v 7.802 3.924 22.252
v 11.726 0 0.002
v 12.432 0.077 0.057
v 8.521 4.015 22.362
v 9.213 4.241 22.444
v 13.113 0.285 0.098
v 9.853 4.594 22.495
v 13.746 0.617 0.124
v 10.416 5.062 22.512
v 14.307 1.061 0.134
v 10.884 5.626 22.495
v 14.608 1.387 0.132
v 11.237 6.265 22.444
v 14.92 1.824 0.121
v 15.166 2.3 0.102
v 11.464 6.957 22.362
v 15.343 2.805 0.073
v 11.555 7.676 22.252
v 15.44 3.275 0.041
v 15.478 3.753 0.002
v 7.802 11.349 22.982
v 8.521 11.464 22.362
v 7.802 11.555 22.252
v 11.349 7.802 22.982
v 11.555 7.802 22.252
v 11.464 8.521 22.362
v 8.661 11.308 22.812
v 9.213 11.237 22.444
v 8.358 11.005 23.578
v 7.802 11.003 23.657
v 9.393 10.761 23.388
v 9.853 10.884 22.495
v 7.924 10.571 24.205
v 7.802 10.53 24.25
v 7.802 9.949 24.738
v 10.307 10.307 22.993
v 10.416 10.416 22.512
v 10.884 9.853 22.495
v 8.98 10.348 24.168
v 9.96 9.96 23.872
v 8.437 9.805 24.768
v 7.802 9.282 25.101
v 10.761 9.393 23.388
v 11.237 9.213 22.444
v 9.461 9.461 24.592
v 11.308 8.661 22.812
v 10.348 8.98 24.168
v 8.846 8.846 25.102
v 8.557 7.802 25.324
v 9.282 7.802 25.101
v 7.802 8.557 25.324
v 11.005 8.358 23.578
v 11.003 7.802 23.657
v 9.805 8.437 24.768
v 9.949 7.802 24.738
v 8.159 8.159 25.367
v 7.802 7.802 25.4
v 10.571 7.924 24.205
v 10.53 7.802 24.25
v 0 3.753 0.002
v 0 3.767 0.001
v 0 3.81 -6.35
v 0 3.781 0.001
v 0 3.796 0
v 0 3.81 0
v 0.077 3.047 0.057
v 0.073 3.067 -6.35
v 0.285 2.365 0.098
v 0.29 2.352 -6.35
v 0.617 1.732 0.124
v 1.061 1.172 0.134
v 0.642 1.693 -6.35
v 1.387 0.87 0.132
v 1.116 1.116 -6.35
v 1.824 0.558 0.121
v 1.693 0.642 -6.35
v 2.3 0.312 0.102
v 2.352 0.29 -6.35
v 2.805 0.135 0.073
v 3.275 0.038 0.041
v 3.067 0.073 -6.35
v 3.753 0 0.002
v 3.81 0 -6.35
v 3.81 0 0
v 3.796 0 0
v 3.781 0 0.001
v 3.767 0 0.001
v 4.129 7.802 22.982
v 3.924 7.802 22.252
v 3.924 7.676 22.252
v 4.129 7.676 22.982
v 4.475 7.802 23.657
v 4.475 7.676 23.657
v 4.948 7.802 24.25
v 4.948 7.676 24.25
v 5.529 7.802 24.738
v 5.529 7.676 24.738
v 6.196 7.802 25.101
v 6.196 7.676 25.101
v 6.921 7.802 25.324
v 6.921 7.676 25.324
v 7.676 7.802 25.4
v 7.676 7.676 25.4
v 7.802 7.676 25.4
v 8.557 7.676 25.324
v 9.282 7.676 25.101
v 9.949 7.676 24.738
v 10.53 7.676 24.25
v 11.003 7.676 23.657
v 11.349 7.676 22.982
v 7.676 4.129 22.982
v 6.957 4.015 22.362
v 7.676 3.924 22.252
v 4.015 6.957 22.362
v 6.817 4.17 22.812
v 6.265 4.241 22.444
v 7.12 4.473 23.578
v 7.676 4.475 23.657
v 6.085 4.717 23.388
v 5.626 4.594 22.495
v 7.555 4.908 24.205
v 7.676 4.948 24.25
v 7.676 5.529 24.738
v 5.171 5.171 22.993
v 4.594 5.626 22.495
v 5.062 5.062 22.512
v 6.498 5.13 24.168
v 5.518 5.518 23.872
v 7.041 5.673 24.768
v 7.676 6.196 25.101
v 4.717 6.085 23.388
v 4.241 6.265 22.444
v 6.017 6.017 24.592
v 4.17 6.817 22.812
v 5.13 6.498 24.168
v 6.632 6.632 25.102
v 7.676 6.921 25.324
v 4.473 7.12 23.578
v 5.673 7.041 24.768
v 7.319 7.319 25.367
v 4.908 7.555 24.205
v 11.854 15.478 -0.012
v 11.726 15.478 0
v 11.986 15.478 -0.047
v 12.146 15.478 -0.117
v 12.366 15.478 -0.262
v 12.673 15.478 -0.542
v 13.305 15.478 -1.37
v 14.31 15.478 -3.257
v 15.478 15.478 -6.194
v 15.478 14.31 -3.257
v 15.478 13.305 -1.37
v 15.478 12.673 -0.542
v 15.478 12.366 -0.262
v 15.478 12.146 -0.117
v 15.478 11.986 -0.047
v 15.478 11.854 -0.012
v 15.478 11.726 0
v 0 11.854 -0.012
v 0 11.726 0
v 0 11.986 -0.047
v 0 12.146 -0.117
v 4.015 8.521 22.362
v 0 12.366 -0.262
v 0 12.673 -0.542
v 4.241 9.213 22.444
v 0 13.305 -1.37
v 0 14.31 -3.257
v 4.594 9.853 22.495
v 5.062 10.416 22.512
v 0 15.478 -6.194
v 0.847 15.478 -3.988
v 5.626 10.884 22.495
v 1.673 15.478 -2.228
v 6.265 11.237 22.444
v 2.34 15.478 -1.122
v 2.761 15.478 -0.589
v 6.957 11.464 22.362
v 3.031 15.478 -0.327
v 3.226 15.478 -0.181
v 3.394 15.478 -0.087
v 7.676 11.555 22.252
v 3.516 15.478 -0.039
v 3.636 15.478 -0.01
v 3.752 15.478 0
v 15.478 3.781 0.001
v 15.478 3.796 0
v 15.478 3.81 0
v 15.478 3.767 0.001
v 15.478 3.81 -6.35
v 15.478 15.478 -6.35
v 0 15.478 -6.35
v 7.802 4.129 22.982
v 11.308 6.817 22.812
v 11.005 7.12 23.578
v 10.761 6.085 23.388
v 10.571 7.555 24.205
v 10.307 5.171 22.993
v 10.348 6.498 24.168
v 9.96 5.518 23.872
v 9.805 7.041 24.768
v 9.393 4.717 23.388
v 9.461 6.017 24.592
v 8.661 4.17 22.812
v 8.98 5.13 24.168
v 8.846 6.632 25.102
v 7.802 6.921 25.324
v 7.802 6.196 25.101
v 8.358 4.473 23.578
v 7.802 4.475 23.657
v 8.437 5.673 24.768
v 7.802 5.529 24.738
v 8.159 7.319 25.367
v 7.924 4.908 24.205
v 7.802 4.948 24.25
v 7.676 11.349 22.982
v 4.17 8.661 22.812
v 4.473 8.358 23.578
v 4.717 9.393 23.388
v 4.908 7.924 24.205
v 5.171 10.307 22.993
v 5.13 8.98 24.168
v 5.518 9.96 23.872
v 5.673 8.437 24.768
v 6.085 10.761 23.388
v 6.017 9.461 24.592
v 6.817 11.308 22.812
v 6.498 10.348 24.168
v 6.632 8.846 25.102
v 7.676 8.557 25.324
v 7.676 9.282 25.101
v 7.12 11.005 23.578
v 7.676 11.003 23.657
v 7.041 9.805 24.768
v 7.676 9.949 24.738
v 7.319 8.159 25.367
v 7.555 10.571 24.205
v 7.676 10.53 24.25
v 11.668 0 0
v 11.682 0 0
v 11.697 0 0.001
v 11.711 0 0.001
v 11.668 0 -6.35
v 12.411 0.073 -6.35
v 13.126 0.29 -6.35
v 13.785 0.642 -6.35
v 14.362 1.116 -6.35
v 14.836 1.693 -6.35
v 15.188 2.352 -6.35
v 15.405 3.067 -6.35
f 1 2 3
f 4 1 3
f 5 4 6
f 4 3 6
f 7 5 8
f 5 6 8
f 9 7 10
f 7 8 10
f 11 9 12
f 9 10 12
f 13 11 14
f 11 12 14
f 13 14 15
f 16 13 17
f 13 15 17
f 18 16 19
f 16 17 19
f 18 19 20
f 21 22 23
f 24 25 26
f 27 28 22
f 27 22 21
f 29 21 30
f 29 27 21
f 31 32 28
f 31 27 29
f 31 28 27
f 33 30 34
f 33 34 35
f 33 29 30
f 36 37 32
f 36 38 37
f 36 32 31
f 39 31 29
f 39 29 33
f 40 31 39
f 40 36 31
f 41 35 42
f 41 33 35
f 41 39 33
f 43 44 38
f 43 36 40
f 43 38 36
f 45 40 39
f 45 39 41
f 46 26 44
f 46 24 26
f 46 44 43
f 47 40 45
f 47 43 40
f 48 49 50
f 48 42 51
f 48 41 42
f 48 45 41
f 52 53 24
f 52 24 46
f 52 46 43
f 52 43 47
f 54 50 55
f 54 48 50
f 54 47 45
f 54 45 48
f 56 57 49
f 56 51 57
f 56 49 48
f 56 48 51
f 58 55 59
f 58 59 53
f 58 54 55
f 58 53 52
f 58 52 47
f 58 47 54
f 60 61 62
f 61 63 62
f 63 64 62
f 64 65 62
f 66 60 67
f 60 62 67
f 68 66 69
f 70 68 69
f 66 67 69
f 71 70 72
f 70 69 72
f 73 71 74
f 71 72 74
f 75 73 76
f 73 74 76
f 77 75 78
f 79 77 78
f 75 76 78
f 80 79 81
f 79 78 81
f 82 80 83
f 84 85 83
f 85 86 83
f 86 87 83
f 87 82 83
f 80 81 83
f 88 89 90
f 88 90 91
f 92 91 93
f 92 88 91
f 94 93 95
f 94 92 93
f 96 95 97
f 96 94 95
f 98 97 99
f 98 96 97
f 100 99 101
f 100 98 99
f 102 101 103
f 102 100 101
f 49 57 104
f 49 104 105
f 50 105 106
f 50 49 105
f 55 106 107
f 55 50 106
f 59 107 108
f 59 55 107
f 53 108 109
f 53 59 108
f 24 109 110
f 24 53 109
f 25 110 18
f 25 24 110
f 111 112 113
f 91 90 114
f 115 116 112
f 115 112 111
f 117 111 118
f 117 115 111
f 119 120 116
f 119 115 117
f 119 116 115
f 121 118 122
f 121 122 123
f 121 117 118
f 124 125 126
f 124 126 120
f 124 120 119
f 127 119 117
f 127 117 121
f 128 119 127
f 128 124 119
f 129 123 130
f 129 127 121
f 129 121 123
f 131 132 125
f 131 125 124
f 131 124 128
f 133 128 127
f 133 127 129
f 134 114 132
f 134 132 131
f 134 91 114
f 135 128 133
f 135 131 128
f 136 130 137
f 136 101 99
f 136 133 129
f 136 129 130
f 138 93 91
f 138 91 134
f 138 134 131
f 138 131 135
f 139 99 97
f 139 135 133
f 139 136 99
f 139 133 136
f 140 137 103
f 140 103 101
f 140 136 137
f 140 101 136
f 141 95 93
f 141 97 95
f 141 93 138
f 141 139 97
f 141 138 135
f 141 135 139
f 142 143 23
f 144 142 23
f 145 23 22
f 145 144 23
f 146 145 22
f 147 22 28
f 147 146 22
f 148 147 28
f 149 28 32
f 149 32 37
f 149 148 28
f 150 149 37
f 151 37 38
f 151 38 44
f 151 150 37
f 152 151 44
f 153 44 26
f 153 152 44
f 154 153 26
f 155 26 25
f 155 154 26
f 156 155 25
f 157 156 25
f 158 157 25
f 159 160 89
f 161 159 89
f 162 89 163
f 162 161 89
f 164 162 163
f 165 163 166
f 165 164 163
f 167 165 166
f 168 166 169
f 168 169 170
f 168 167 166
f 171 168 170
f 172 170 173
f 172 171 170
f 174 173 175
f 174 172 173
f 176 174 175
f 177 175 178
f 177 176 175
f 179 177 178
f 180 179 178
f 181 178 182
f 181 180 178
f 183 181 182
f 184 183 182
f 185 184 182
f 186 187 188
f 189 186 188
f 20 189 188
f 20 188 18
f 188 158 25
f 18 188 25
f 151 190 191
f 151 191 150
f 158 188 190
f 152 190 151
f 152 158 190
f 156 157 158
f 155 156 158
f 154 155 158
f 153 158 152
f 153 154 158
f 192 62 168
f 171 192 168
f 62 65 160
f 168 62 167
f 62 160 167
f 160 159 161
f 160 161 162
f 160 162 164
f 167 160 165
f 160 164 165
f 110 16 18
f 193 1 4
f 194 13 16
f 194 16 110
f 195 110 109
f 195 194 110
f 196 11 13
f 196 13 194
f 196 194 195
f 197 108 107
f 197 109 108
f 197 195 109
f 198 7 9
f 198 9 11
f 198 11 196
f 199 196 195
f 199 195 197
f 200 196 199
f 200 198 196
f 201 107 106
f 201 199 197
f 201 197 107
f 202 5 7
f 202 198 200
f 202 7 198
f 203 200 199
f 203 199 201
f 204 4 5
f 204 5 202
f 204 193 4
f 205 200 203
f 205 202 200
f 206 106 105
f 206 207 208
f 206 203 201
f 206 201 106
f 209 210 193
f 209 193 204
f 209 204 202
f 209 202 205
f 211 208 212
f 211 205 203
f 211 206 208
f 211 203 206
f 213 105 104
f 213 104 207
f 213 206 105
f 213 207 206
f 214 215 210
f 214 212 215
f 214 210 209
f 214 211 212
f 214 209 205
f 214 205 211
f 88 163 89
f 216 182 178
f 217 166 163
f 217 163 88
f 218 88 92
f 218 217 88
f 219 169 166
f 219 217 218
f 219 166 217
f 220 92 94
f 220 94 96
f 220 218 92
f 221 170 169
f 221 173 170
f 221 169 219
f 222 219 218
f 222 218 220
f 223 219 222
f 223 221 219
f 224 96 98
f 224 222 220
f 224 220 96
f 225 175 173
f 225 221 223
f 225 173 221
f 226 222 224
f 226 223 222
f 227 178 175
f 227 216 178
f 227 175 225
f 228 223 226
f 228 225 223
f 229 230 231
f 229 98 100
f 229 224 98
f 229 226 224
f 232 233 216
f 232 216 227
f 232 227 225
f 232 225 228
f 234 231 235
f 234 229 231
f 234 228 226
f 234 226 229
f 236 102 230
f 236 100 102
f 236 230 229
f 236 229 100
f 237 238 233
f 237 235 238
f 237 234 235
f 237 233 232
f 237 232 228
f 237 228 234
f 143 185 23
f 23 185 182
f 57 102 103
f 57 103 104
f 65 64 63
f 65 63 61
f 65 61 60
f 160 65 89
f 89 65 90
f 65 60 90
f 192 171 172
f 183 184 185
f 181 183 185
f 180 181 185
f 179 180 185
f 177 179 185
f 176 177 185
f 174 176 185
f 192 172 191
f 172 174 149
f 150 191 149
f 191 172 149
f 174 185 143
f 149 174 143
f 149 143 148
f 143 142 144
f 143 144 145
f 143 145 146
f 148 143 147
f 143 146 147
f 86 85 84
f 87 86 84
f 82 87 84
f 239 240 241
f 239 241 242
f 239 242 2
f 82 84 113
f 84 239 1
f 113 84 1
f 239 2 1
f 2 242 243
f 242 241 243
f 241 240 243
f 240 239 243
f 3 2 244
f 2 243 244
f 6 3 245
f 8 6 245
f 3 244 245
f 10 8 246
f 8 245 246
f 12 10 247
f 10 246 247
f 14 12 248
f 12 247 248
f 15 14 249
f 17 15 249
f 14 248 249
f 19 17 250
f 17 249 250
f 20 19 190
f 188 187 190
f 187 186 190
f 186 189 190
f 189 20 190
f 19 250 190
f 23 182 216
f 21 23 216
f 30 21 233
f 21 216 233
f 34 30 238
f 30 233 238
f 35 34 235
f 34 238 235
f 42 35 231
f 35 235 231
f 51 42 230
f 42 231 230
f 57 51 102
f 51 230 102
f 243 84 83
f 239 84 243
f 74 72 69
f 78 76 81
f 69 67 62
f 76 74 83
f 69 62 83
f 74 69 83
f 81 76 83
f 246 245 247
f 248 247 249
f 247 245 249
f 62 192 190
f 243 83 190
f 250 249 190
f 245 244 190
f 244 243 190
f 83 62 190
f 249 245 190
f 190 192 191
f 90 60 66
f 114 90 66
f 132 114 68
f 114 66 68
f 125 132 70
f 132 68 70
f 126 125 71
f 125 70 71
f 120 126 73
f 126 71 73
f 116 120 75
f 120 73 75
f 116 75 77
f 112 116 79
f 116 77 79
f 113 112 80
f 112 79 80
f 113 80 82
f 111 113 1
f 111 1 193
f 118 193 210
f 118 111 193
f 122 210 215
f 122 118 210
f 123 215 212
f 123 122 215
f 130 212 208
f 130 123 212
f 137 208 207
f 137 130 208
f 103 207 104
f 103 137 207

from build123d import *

# Parameters (mm, degrees)
F0_W         = 15.478125
F0_H         = 15.478125
F1_DEPTH     = 6.35
F2_DEPTH     = 25.4
F2_TAPER     = 10
F3_T1_DEPTH  = 51.3009034407
F3_T3_DEPTH  = 51.3009034407
F3_T5_DEPTH  = 51.3009034407
F3_T7_DEPTH  = 51.3009034407
F3_T9_DEPTH  = 44.45
F3_T11_DEPTH = 0.1267751904
F3_T13_DEPTH = 0.1267751904
F3_S17_W     = 14.1899336178
F3_S17_H     = 14.1899336178
F3_T18_DEPTH = 7.0949668089
F3_S29_W     = 14.1899336177
F3_S29_H     = 14.1899336178
F3_T30_DEPTH = 7.0949668089
F3_S41_W     = 14.1899336177
F3_S41_H     = 14.1899336178
F3_T42_DEPTH = 7.0949668089
F3_S53_W     = 14.1899336178
F3_S53_H     = 14.1899336178
F3_T54_DEPTH = 7.0949668089


# Not quite as in the source:
# - a fillet or chamfer that OpenCascade refuses, or shapes differently, is made with other operations: its cross-section is extruded or revolved along the edge and cut away or added


with BuildPart() as f1:
    # F0 (on Top) → F1 (new body)
    with BuildSketch(Plane.XY):
        with Locations((7.7390625, 7.7390625)):
            Rectangle(F0_W, F0_H)
    extrude(amount=-F1_DEPTH)

    # F0 (on Top) → F2 (join)
    with BuildSketch(Plane.XY):
        with Locations((7.7390625, 7.7390625)):
            Rectangle(F0_W, F0_H)
    extrude(amount=F2_DEPTH, taper=F2_TAPER)

    # F3: fillet of radius 3.81 on 10 edges, made by hand

    # F3_s2 → F3_t1 (cut)
    with BuildSketch(Plane(origin=(5.649698691, 5.649698691, -32.0410334724), x_dir=(0.7071067812, -0.7071067812, 0), z_dir=(-0.1710878697, -0.1710878697, 0.9702875252))):
        with BuildLine():
            ThreePointArc((-2.6531477556, 18.6646706441), (0, 19.7402772951), (2.6531477556, 18.6646706441))
            Line((2.6531477556, 18.6646706441), (0, 21.238986814))
            Line((0, 21.238986814), (-2.6531477556, 18.6646706441))
        make_face()
    extrude(amount=F3_T1_DEPTH, mode=Mode.SUBTRACT)

    # F3_s4 → F3_t3 (cut)
    with BuildSketch(Plane(origin=(-5.1966375782, 5.1966375782, -29.4715962203), x_dir=(0.7071067812, 0.7071067812, 0), z_dir=(0.1710878697, -0.1710878697, 0.9702875252))):
        with BuildLine():
            ThreePointArc((8.2915393919, 8.0451772371), (10.9446871476, 9.1207838881), (13.5978349032, 8.0451772371))
            Line((13.5978349032, 8.0451772371), (10.9446871476, 10.619493407))
            Line((10.9446871476, 10.619493407), (8.2915393919, 8.0451772371))
        make_face()
    extrude(amount=F3_T3_DEPTH, mode=Mode.SUBTRACT)

    # F3_s6 → F3_t5 (cut)
    with BuildSketch(Plane(origin=(5.1966375782, -5.1966375782, -29.4715962203), x_dir=(-0.7071067812, -0.7071067812, 0), z_dir=(-0.1710878697, 0.1710878697, 0.9702875252))):
        with BuildLine():
            ThreePointArc((-8.2915393919, 8.0451772371), (-10.9446871476, 9.1207838881), (-13.5978349032, 8.0451772371))
            Line((-13.5978349032, 8.0451772371), (-10.9446871476, 10.619493407))
            Line((-10.9446871476, 10.619493407), (-8.2915393919, 8.0451772371))
        make_face()
    extrude(amount=F3_T5_DEPTH, mode=Mode.SUBTRACT)

    # F3_s8 → F3_t7 (cut)
    with BuildSketch(Plane(origin=(-4.7435764654, -4.7435764654, -26.9021589682), x_dir=(-0.7071067812, 0.7071067812, 0), z_dir=(0.1710878697, 0.1710878697, 0.9702875252))):
        with BuildLine():
            ThreePointArc((2.6531477556, -2.5743161699), (0, -1.4987095189), (-2.6531477556, -2.5743161699))
            Line((-2.6531477556, -2.5743161699), (0, 0))
            Line((0, 0), (2.6531477556, -2.5743161699))
        make_face()
    extrude(amount=F3_T7_DEPTH, mode=Mode.SUBTRACT)

    # F3_s10 → F3_t9 (cut)
    with BuildSketch(Plane.XY.offset(-15.875)):
        with BuildLine():
            ThreePointArc((0, 3.81), (1.1159231637, 1.1159231637), (3.81, 0))
            Line((3.81, 0), (0, 0))
            Line((0, 0), (0, 3.81))
        make_face()
        with BuildLine():
            ThreePointArc((11.668125, 0), (14.3622018363, 1.1159231637), (15.478125, 3.81))
            Line((15.478125, 3.81), (15.478125, 0))
            Line((15.478125, 0), (11.668125, 0))
        make_face()
    extrude(amount=F3_T9_DEPTH, mode=Mode.SUBTRACT)

    # F3_s12 → F3_t11 (cut)
    with BuildSketch(Plane.XZ.offset(-7.8024500952)):
        with BuildLine():
            ThreePointArc((7.8024500952, 25.4), (10.2514708881, 24.5086293283), (11.5545676342, 22.2515995569))
            Line((11.5545676342, 22.2515995569), (10.99941969, 25.4))
            Line((10.99941969, 25.4), (7.8024500952, 25.4))
        make_face()
        with BuildLine():
            ThreePointArc((3.9235573658, 22.2515995569), (5.2266541119, 24.5086293283), (7.6756749048, 25.4))
            Line((7.6756749048, 25.4), (4.47870531, 25.4))
            Line((4.47870531, 25.4), (3.9235573658, 22.2515995569))
        make_face()
    extrude(amount=F3_T11_DEPTH, mode=Mode.SUBTRACT)

    # F3_s14 → F3_t13 (cut)
    with BuildSketch(Plane.YZ.offset(7.6756749048)):
        with BuildLine():
            ThreePointArc((3.9235573658, 22.2515995569), (5.2266541119, 24.5086293283), (7.6756749048, 25.4))
            Line((7.6756749048, 25.4), (4.47870531, 25.4))
            Line((4.47870531, 25.4), (3.9235573658, 22.2515995569))
        make_face()
        with BuildLine():
            ThreePointArc((11.5545676342, 22.2515995569), (10.2514708881, 24.5086293283), (7.8024500952, 25.4))
            Line((7.8024500952, 25.4), (10.99941969, 25.4))
            Line((10.99941969, 25.4), (11.5545676342, 22.2515995569))
        make_face()
    extrude(amount=F3_T13_DEPTH, mode=Mode.SUBTRACT)


with BuildPart() as f3_tool16:
    # F3_s17 → F3_t18 (new body)
    with BuildSketch(Plane(origin=(11.6595829736, 11.6595829736, 15.951248959), x_dir=(-0.7071067812, 0.7071067812, 0), z_dir=(0.5082206017, 0.5082206017, 0.6952867322))):
        with Locations((0, 7.8454102114)):
            Rectangle(F3_S17_W, F3_S17_H)
    extrude(amount=F3_T18_DEPTH)

    split(bisect_by=Plane.XZ.offset(-7.8024500952), keep=Keep.BOTTOM)

    split(bisect_by=Plane(origin=(-3.1272635948, -3.1272635948, 17.7355931701), x_dir=(0.7071067812, -0.7071067812, 0), z_dir=(-0.1710878697, -0.1710878697, 0.9702875252)), keep=Keep.TOP)

    split(bisect_by=Plane.YZ.offset(7.8024500952), keep=Keep.TOP)

    split(bisect_by=Plane.XY.offset(25.4), keep=Keep.BOTTOM)

    split(bisect_by=Plane(origin=(15.0114024231, 0, 2.6469152655), x_dir=(0, 1, 0), z_dir=(-0.984807753, 0, -0.1736481777)), keep=Keep.TOP)

    split(bisect_by=Plane(origin=(0, 15.0114024231, 2.6469152655), x_dir=(1, 0, 0), z_dir=(0, -0.984807753, -0.1736481777)), keep=Keep.TOP)

    # F3_s25 → F3_t26 (revolve, cut)
    with BuildSketch(Plane(origin=(7.8024500952, 7.8024500952, 21.59), x_dir=(-0.5082206017, -0.5082206017, -0.6952867322), z_dir=(-0.4916419632, -0.4916419632, 0.7187324676))):
        with BuildLine():
            ThreePointArc((0, -3.81), (3.81, 0), (0, 3.81))
            Line((0, 3.81), (0, -3.81))
        make_face()
    revolve(axis=Axis((7.8024500952, 7.8024500952, 21.59), (0.7071067812, -0.7071067812, 0)), mode=Mode.SUBTRACT)


with BuildPart() as f1_1:
    add(f1.part)

    # F3_t15: cut F3_tool16
    add(f3_tool16.part, mode=Mode.SUBTRACT)


with BuildPart() as f3_tool28:
    # F3_s29 → F3_t30 (new body)
    with BuildSketch(Plane(origin=(-7.6617662372, 7.6617662372, 10.4819135463), x_dir=(-0.7071067812, -0.7071067812, 0), z_dir=(-0.5082206017, 0.5082206017, 0.6952867322))):
        with Locations((-10.9446871475, 15.455105973)):
            Rectangle(F3_S29_W, F3_S29_H)
    extrude(amount=F3_T30_DEPTH)

    split(bisect_by=Plane.XZ.offset(-7.8024500952), keep=Keep.BOTTOM)

    split(bisect_by=Plane(origin=(3.5803247075, -3.5803247075, 20.3050304222), x_dir=(0.7071067812, 0.7071067812, 0), z_dir=(0.1710878697, -0.1710878697, 0.9702875252)), keep=Keep.TOP)

    split(bisect_by=Plane.YZ.offset(7.6756749048), keep=Keep.BOTTOM)

    split(bisect_by=Plane.XY.offset(25.4), keep=Keep.BOTTOM)

    split(bisect_by=Plane(origin=(0, 0, 0), x_dir=(0, 1, 0), z_dir=(0.984807753, 0, -0.1736481777)), keep=Keep.TOP)

    split(bisect_by=Plane(origin=(0, 15.0114024231, 2.6469152655), x_dir=(1, 0, 0), z_dir=(0, -0.984807753, -0.1736481777)), keep=Keep.TOP)

    # F3_s37 → F3_t38 (revolve, cut)
    with BuildSketch(Plane(origin=(7.6756749048, 7.8024500952, 21.59), x_dir=(0.5082206017, -0.5082206017, -0.6952867322), z_dir=(0.4916419632, -0.4916419632, 0.7187324676))):
        with BuildLine():
            ThreePointArc((0, -3.81), (3.81, 0), (0, 3.81))
            Line((0, 3.81), (0, -3.81))
        make_face()
    revolve(axis=Axis((7.6756749048, 7.8024500952, 21.59), (0.7071067812, 0.7071067812, 0)), mode=Mode.SUBTRACT)


with BuildPart() as f1_2:
    add(f1_1.part)

    # F3_t27: cut F3_tool28
    add(f3_tool28.part, mode=Mode.SUBTRACT)


with BuildPart() as f3_tool40:
    # F3_s41 → F3_t42 (new body)
    with BuildSketch(Plane(origin=(7.6617662372, -7.6617662372, 10.4819135463), x_dir=(0.7071067812, 0.7071067812, 0), z_dir=(0.5082206017, -0.5082206017, 0.6952867322))):
        with Locations((10.9446871475, 15.455105973)):
            Rectangle(F3_S41_W, F3_S41_H)
    extrude(amount=F3_T42_DEPTH)

    split(bisect_by=Plane.XZ.offset(-7.6756749048), keep=Keep.TOP)

    split(bisect_by=Plane(origin=(-3.5803247075, 3.5803247075, 20.3050304222), x_dir=(-0.7071067812, -0.7071067812, 0), z_dir=(-0.1710878697, 0.1710878697, 0.9702875252)), keep=Keep.TOP)

    split(bisect_by=Plane.YZ.offset(7.8024500952), keep=Keep.TOP)

    split(bisect_by=Plane.XY.offset(25.4), keep=Keep.BOTTOM)

    split(bisect_by=Plane(origin=(15.0114024231, 0, 2.6469152655), x_dir=(0, 1, 0), z_dir=(-0.984807753, 0, -0.1736481777)), keep=Keep.TOP)

    split(bisect_by=Plane(origin=(0, 0, 0), x_dir=(1, 0, 0), z_dir=(0, 0.984807753, -0.1736481777)), keep=Keep.TOP)

    # F3_s49 → F3_t50 (revolve, cut)
    with BuildSketch(Plane(origin=(7.8024500952, 7.6756749048, 21.59), x_dir=(-0.5082206017, 0.5082206017, -0.6952867322), z_dir=(-0.4916419632, 0.4916419632, 0.7187324676))):
        with BuildLine():
            ThreePointArc((0, -3.81), (3.81, 0), (0, 3.81))
            Line((0, 3.81), (0, -3.81))
        make_face()
    revolve(axis=Axis((7.8024500952, 7.6756749048, 21.59), (-0.7071067812, -0.7071067812, 0)), mode=Mode.SUBTRACT)


with BuildPart() as f1_3:
    add(f1_2.part)

    # F3_t39: cut F3_tool40
    add(f3_tool40.part, mode=Mode.SUBTRACT)


with BuildPart() as f3_tool52:
    # F3_s53 → F3_t54 (new body)
    with BuildSketch(Plane(origin=(-3.6639495007, -3.6639495007, 5.0125781335), x_dir=(0.7071067812, -0.7071067812, 0), z_dir=(-0.5082206017, -0.5082206017, 0.6952867322))):
        with Locations((0, 23.0648017346)):
            Rectangle(F3_S53_W, F3_S53_H)
    extrude(amount=F3_T54_DEPTH)

    split(bisect_by=Plane.XZ.offset(-7.6756749048), keep=Keep.TOP)

    split(bisect_by=Plane(origin=(4.0333858203, 4.0333858203, 22.8744676743), x_dir=(-0.7071067812, 0.7071067812, 0), z_dir=(0.1710878697, 0.1710878697, 0.9702875252)), keep=Keep.TOP)

    split(bisect_by=Plane.YZ.offset(7.6756749048), keep=Keep.BOTTOM)

    split(bisect_by=Plane.XY.offset(25.4), keep=Keep.BOTTOM)

    split(bisect_by=Plane(origin=(0, 0, 0), x_dir=(0, 1, 0), z_dir=(0.984807753, 0, -0.1736481777)), keep=Keep.TOP)

    split(bisect_by=Plane(origin=(0, 0, 0), x_dir=(1, 0, 0), z_dir=(0, 0.984807753, -0.1736481777)), keep=Keep.TOP)

    # F3_s61 → F3_t62 (revolve, cut)
    with BuildSketch(Plane(origin=(7.6756749048, 7.6756749048, 21.59), x_dir=(0.5082206017, 0.5082206017, -0.6952867322), z_dir=(0.4916419632, 0.4916419632, 0.7187324676))):
        with BuildLine():
            ThreePointArc((0, -3.81), (3.81, 0), (0, 3.81))
            Line((0, 3.81), (0, -3.81))
        make_face()
    revolve(axis=Axis((7.6756749048, 7.6756749048, 21.59), (-0.7071067812, 0.7071067812, 0)), mode=Mode.SUBTRACT)


with BuildPart() as f1_4:
    add(f1_3.part)

    # F3_t51: cut F3_tool52
    add(f3_tool52.part, mode=Mode.SUBTRACT)


solid = f1_4.part
